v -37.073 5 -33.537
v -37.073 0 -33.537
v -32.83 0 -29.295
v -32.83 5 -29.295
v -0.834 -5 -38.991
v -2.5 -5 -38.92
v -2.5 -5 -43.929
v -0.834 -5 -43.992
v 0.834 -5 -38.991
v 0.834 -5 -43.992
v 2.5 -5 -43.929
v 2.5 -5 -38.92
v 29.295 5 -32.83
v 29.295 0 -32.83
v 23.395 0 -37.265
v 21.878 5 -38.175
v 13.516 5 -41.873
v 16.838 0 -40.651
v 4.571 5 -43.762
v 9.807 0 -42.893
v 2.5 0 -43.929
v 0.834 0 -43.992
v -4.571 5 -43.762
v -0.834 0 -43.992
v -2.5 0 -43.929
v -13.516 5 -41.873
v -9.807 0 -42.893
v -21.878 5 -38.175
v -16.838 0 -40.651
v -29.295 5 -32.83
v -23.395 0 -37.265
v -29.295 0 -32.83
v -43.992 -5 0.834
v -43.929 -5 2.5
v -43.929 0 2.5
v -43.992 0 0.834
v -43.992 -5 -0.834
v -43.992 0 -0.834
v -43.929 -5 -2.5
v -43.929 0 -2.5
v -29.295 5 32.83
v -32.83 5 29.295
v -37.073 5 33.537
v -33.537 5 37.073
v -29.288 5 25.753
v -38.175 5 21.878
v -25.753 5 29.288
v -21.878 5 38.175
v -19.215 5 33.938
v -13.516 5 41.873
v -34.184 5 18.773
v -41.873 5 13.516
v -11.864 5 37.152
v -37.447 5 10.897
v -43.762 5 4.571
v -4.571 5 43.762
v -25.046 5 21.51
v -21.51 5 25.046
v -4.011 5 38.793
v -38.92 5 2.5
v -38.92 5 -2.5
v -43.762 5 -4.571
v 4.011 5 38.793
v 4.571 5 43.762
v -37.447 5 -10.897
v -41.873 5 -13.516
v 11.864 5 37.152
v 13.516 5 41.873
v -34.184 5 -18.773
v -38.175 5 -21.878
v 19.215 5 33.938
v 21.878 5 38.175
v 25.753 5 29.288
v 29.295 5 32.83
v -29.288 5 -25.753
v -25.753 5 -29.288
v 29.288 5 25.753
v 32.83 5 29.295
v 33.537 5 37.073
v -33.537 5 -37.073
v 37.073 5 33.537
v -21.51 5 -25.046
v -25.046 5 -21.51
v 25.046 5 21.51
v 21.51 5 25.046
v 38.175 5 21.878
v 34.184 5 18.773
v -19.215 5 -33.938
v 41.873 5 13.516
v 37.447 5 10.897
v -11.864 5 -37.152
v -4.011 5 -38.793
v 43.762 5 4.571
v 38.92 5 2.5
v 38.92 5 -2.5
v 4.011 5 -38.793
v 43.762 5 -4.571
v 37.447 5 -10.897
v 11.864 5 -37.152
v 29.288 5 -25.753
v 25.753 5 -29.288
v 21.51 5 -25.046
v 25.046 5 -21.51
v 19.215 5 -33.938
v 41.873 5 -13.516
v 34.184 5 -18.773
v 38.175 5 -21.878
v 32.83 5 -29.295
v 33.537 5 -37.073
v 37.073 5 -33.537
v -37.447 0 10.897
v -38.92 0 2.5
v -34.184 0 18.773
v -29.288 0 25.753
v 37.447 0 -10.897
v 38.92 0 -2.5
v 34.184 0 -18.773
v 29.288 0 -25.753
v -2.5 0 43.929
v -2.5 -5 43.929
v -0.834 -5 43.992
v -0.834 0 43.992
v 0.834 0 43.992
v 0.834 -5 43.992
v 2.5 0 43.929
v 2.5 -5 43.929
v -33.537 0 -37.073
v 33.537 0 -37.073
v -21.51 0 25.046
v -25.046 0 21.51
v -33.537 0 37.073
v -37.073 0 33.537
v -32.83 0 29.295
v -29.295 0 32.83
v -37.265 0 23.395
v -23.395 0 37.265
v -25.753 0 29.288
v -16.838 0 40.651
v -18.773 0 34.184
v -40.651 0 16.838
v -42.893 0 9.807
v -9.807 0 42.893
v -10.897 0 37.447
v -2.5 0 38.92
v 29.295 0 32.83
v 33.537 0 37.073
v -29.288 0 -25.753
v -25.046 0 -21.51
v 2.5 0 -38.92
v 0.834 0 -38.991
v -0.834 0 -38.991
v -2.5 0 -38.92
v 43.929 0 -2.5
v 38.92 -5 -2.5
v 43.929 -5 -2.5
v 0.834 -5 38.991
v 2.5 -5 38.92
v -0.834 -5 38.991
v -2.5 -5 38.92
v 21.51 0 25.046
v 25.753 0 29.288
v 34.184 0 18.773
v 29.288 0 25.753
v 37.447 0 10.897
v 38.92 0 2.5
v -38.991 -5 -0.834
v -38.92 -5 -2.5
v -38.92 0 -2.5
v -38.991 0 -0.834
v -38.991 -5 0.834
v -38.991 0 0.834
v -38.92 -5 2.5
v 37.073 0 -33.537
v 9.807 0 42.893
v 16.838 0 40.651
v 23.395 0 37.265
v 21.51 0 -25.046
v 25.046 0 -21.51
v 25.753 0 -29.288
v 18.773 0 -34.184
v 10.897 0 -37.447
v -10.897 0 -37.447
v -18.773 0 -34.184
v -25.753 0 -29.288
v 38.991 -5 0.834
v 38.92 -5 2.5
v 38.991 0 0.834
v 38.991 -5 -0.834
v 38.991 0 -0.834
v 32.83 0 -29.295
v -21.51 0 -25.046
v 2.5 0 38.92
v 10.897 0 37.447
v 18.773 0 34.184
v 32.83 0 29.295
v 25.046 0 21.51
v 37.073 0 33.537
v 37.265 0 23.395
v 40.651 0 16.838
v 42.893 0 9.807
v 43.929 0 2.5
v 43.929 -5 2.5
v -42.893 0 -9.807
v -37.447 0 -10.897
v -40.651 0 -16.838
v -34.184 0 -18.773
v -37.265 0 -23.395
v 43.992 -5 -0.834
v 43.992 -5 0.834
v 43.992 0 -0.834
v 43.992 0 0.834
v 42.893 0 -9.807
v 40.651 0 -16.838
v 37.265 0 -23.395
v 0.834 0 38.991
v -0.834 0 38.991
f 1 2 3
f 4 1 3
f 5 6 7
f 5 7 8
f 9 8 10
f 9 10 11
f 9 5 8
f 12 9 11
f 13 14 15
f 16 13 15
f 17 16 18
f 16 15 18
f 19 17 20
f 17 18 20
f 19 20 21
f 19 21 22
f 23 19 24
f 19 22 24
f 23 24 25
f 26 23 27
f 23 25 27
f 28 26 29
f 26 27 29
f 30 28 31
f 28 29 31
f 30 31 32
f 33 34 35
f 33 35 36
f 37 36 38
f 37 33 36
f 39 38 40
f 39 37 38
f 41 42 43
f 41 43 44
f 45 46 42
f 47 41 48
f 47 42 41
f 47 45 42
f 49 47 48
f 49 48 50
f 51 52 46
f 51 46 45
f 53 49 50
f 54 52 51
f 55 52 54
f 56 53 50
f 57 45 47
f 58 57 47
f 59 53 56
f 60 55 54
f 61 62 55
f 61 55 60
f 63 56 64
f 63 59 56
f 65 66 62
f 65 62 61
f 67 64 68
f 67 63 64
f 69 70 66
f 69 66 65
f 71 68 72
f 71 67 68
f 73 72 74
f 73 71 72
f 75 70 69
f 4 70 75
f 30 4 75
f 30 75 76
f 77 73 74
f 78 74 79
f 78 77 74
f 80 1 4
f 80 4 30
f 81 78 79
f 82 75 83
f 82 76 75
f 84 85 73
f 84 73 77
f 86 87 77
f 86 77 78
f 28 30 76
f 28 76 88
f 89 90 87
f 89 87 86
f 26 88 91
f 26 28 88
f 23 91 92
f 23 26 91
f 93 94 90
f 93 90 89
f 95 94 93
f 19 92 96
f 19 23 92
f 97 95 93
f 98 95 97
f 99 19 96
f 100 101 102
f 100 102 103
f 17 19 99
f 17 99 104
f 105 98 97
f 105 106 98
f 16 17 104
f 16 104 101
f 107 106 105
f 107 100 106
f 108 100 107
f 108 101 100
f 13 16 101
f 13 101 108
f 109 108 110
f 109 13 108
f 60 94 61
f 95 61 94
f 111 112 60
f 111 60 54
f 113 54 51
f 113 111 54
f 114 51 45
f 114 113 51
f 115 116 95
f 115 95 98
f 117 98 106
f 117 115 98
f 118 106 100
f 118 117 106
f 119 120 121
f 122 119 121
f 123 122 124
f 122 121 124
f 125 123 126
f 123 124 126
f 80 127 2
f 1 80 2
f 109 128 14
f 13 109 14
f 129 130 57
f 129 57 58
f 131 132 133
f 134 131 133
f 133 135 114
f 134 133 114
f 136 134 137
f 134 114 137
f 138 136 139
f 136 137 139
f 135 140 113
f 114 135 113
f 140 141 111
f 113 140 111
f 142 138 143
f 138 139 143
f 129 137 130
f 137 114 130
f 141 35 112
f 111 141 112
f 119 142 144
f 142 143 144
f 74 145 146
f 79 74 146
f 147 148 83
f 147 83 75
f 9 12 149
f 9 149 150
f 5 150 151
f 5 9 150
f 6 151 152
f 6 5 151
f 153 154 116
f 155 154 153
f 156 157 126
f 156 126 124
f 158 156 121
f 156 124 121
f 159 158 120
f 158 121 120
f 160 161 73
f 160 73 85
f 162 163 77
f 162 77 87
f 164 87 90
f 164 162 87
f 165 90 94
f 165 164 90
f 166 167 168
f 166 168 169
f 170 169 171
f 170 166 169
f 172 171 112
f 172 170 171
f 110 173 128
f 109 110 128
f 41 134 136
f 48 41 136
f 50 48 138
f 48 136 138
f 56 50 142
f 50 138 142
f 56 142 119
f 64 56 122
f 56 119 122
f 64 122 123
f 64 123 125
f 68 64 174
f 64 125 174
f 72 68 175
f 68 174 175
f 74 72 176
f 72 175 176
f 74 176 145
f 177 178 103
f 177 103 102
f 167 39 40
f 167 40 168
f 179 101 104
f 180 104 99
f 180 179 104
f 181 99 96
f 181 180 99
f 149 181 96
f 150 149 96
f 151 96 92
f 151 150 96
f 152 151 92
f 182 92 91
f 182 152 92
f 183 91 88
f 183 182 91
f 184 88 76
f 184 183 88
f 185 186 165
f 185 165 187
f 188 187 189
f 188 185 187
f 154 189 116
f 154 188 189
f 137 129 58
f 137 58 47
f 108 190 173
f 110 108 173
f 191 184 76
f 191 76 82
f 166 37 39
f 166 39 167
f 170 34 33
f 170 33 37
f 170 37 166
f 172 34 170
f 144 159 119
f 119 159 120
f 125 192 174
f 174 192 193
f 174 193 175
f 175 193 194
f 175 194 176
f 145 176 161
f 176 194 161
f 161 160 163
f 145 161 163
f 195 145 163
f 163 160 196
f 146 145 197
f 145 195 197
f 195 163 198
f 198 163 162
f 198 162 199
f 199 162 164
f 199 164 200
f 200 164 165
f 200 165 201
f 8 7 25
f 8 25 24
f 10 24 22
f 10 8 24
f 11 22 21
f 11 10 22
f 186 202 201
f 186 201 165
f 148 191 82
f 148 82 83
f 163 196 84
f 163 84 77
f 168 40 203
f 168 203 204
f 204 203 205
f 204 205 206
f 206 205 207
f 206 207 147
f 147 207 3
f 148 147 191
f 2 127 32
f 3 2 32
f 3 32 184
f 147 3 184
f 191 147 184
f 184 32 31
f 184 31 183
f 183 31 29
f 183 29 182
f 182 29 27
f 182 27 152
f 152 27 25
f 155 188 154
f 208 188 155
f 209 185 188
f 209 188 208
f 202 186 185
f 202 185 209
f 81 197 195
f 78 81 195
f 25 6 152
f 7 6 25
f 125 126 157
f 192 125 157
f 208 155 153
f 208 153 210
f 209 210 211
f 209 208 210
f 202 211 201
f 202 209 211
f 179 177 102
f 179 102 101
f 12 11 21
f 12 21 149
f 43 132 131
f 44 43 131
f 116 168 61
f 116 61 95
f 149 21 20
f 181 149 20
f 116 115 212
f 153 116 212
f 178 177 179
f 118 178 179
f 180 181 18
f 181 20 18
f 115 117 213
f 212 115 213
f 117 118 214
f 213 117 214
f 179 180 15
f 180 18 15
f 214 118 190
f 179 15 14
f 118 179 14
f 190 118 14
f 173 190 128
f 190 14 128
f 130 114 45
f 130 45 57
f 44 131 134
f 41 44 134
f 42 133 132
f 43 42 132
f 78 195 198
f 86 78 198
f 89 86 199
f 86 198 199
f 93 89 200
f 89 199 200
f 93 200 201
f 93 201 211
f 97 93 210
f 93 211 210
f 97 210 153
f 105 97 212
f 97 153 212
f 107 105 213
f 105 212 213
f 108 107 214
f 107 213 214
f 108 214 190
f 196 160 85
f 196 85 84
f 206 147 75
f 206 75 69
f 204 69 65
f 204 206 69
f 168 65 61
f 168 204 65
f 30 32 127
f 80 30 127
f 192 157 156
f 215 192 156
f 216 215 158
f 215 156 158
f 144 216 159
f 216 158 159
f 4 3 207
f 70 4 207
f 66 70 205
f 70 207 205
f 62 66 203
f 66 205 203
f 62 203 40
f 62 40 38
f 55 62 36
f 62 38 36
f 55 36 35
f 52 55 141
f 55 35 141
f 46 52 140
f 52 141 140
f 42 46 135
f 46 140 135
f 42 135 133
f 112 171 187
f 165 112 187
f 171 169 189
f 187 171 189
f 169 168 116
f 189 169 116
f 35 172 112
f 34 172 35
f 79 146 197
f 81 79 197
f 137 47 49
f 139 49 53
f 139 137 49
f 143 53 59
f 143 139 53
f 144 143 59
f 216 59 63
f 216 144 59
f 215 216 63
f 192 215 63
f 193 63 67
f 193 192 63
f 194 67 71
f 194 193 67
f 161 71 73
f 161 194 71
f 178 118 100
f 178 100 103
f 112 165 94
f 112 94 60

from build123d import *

# Parameters (mm, degrees)
BOSS_EXTRUDE1_DEPTH = 5
BOSS_EXTRUDE2_START = 5
BOSS_EXTRUDE2_DEPTH = 5


with BuildPart() as part:
    # Sketch1 → Boss-Extrude1 (new body)
    with BuildSketch(Plane(origin=(0, 0, 0), x_dir=(1, 0, 0), z_dir=(0, 1, 0))):
        with BuildLine():
            Line((-35.30507781, 35.30507781), (-37.072844763, 33.537310857))
            Line((-37.072844763, 33.537310857), (-32.830204076, 29.29467017))
            ThreePointArc((-32.830204076, 29.29467017), (-44, 0), (-32.830204076, -29.29467017))
            Line((-32.830204076, -29.29467017), (-37.072844763, -33.537310857))
            Line((-37.072844763, -33.537310857), (-35.30507781, -35.30507781))
            Line((-35.30507781, -35.30507781), (-33.537310857, -37.072844763))
            Line((-33.537310857, -37.072844763), (-29.29467017, -32.830204076))
            ThreePointArc((-29.29467017, -32.830204076), (0, -44), (29.29467017, -32.830204076))
            Line((29.29467017, -32.830204076), (33.537310857, -37.072844763))
            Line((33.537310857, -37.072844763), (35.30507781, -35.30507781))
            Line((35.30507781, -35.30507781), (37.072844763, -33.537310857))
            Line((37.072844763, -33.537310857), (32.830204076, -29.29467017))
            ThreePointArc((32.830204076, -29.29467017), (44, 0), (32.830204076, 29.29467017))
            Line((32.830204076, 29.29467017), (37.072844763, 33.537310857))
            Line((37.072844763, 33.537310857), (35.30507781, 35.30507781))
            Line((35.30507781, 35.30507781), (33.537310857, 37.072844763))
            Line((33.537310857, 37.072844763), (29.29467017, 32.830204076))
            ThreePointArc((29.29467017, 32.830204076), (0, 44), (-29.29467017, 32.830204076))
            Line((-29.29467017, 32.830204076), (-33.537310857, 37.072844763))
            Line((-33.537310857, 37.072844763), (-35.30507781, 35.30507781))
        make_face()
        with BuildLine():
            Line((-38.919789311, 2.5), (38.919789311, 2.5))
            ThreePointArc((38.919789311, 2.5), (36.031301768, 14.924653862), (29.288213897, 25.752679991))
            Line((29.288213897, 25.752679991), (25.04557321, 21.510039304))
            Line((25.04557321, 21.510039304), (21.510039304, 25.04557321))
            Line((21.510039304, 25.04557321), (25.752679991, 29.288213897))
            ThreePointArc((25.752679991, 29.288213897), (0, 39), (-25.752679991, 29.288213897))
            Line((-25.752679991, 29.288213897), (-21.510039304, 25.04557321))
            Line((-21.510039304, 25.04557321), (-25.04557321, 21.510039304))
            Line((-25.04557321, 21.510039304), (-29.288213897, 25.752679991))
            ThreePointArc((-29.288213897, 25.752679991), (-36.031301768, 14.924653862), (-38.919789311, 2.5))
        make_face(mode=Mode.SUBTRACT)
        with BuildLine():
            Line((38.919789311, -2.5), (-38.919789311, -2.5))
            ThreePointArc((-38.919789311, -2.5), (-36.031301768, -14.924653862), (-29.288213897, -25.752679991))
            Line((-29.288213897, -25.752679991), (-25.04557321, -21.510039304))
            Line((-25.04557321, -21.510039304), (-21.510039304, -25.04557321))
            Line((-21.510039304, -25.04557321), (-25.752679991, -29.288213897))
            ThreePointArc((-25.752679991, -29.288213897), (0, -39), (25.752679991, -29.288213897))
            Line((25.752679991, -29.288213897), (21.510039304, -25.04557321))
            Line((21.510039304, -25.04557321), (25.04557321, -21.510039304))
            Line((25.04557321, -21.510039304), (29.288213897, -25.752679991))
            ThreePointArc((29.288213897, -25.752679991), (36.031301768, -14.924653862), (38.919789311, -2.5))
        make_face(mode=Mode.SUBTRACT)
    extrude(amount=BOSS_EXTRUDE1_DEPTH)

    # Sketch2 → Boss-Extrude2 (add)
    with BuildSketch(Plane.XZ.offset(BOSS_EXTRUDE2_START)):
        with BuildLine():
            Line((-38.919789311, 2.5), (-43.928919859, 2.5))
            ThreePointArc((-43.928919859, 2.5), (-44, 0), (-43.928919859, -2.5))
            Line((-43.928919859, -2.5), (-38.919789311, -2.5))
            ThreePointArc((-38.919789311, -2.5), (-39, 0), (-38.919789311, 2.5))
        make_face()
        with BuildLine():
            Line((-2.5, 38.919789311), (-2.5, 43.928919859))
            ThreePointArc((-2.5, 43.928919859), (0, 44), (2.5, 43.928919859))
            Line((2.5, 43.928919859), (2.5, 38.919789311))
            ThreePointArc((2.5, 38.919789311), (0, 39), (-2.5, 38.919789311))
        make_face()
        with BuildLine():
            Line((38.919789311, -2.5), (43.928919859, -2.5))
            ThreePointArc((43.928919859, -2.5), (44, 0), (43.928919859, 2.5))
            Line((43.928919859, 2.5), (38.919789311, 2.5))
            ThreePointArc((38.919789311, 2.5), (39, 0), (38.919789311, -2.5))
        make_face()
        with BuildLine():
            Line((2.5, -43.928919859), (2.5, -38.919789311))
            ThreePointArc((2.5, -38.919789311), (0, -39), (-2.5, -38.919789311))
            Line((-2.5, -38.919789311), (-2.5, -43.928919859))
            ThreePointArc((-2.5, -43.928919859), (0, -44), (2.5, -43.928919859))
        make_face()
    extrude(amount=-BOSS_EXTRUDE2_DEPTH)


solid = part.part
